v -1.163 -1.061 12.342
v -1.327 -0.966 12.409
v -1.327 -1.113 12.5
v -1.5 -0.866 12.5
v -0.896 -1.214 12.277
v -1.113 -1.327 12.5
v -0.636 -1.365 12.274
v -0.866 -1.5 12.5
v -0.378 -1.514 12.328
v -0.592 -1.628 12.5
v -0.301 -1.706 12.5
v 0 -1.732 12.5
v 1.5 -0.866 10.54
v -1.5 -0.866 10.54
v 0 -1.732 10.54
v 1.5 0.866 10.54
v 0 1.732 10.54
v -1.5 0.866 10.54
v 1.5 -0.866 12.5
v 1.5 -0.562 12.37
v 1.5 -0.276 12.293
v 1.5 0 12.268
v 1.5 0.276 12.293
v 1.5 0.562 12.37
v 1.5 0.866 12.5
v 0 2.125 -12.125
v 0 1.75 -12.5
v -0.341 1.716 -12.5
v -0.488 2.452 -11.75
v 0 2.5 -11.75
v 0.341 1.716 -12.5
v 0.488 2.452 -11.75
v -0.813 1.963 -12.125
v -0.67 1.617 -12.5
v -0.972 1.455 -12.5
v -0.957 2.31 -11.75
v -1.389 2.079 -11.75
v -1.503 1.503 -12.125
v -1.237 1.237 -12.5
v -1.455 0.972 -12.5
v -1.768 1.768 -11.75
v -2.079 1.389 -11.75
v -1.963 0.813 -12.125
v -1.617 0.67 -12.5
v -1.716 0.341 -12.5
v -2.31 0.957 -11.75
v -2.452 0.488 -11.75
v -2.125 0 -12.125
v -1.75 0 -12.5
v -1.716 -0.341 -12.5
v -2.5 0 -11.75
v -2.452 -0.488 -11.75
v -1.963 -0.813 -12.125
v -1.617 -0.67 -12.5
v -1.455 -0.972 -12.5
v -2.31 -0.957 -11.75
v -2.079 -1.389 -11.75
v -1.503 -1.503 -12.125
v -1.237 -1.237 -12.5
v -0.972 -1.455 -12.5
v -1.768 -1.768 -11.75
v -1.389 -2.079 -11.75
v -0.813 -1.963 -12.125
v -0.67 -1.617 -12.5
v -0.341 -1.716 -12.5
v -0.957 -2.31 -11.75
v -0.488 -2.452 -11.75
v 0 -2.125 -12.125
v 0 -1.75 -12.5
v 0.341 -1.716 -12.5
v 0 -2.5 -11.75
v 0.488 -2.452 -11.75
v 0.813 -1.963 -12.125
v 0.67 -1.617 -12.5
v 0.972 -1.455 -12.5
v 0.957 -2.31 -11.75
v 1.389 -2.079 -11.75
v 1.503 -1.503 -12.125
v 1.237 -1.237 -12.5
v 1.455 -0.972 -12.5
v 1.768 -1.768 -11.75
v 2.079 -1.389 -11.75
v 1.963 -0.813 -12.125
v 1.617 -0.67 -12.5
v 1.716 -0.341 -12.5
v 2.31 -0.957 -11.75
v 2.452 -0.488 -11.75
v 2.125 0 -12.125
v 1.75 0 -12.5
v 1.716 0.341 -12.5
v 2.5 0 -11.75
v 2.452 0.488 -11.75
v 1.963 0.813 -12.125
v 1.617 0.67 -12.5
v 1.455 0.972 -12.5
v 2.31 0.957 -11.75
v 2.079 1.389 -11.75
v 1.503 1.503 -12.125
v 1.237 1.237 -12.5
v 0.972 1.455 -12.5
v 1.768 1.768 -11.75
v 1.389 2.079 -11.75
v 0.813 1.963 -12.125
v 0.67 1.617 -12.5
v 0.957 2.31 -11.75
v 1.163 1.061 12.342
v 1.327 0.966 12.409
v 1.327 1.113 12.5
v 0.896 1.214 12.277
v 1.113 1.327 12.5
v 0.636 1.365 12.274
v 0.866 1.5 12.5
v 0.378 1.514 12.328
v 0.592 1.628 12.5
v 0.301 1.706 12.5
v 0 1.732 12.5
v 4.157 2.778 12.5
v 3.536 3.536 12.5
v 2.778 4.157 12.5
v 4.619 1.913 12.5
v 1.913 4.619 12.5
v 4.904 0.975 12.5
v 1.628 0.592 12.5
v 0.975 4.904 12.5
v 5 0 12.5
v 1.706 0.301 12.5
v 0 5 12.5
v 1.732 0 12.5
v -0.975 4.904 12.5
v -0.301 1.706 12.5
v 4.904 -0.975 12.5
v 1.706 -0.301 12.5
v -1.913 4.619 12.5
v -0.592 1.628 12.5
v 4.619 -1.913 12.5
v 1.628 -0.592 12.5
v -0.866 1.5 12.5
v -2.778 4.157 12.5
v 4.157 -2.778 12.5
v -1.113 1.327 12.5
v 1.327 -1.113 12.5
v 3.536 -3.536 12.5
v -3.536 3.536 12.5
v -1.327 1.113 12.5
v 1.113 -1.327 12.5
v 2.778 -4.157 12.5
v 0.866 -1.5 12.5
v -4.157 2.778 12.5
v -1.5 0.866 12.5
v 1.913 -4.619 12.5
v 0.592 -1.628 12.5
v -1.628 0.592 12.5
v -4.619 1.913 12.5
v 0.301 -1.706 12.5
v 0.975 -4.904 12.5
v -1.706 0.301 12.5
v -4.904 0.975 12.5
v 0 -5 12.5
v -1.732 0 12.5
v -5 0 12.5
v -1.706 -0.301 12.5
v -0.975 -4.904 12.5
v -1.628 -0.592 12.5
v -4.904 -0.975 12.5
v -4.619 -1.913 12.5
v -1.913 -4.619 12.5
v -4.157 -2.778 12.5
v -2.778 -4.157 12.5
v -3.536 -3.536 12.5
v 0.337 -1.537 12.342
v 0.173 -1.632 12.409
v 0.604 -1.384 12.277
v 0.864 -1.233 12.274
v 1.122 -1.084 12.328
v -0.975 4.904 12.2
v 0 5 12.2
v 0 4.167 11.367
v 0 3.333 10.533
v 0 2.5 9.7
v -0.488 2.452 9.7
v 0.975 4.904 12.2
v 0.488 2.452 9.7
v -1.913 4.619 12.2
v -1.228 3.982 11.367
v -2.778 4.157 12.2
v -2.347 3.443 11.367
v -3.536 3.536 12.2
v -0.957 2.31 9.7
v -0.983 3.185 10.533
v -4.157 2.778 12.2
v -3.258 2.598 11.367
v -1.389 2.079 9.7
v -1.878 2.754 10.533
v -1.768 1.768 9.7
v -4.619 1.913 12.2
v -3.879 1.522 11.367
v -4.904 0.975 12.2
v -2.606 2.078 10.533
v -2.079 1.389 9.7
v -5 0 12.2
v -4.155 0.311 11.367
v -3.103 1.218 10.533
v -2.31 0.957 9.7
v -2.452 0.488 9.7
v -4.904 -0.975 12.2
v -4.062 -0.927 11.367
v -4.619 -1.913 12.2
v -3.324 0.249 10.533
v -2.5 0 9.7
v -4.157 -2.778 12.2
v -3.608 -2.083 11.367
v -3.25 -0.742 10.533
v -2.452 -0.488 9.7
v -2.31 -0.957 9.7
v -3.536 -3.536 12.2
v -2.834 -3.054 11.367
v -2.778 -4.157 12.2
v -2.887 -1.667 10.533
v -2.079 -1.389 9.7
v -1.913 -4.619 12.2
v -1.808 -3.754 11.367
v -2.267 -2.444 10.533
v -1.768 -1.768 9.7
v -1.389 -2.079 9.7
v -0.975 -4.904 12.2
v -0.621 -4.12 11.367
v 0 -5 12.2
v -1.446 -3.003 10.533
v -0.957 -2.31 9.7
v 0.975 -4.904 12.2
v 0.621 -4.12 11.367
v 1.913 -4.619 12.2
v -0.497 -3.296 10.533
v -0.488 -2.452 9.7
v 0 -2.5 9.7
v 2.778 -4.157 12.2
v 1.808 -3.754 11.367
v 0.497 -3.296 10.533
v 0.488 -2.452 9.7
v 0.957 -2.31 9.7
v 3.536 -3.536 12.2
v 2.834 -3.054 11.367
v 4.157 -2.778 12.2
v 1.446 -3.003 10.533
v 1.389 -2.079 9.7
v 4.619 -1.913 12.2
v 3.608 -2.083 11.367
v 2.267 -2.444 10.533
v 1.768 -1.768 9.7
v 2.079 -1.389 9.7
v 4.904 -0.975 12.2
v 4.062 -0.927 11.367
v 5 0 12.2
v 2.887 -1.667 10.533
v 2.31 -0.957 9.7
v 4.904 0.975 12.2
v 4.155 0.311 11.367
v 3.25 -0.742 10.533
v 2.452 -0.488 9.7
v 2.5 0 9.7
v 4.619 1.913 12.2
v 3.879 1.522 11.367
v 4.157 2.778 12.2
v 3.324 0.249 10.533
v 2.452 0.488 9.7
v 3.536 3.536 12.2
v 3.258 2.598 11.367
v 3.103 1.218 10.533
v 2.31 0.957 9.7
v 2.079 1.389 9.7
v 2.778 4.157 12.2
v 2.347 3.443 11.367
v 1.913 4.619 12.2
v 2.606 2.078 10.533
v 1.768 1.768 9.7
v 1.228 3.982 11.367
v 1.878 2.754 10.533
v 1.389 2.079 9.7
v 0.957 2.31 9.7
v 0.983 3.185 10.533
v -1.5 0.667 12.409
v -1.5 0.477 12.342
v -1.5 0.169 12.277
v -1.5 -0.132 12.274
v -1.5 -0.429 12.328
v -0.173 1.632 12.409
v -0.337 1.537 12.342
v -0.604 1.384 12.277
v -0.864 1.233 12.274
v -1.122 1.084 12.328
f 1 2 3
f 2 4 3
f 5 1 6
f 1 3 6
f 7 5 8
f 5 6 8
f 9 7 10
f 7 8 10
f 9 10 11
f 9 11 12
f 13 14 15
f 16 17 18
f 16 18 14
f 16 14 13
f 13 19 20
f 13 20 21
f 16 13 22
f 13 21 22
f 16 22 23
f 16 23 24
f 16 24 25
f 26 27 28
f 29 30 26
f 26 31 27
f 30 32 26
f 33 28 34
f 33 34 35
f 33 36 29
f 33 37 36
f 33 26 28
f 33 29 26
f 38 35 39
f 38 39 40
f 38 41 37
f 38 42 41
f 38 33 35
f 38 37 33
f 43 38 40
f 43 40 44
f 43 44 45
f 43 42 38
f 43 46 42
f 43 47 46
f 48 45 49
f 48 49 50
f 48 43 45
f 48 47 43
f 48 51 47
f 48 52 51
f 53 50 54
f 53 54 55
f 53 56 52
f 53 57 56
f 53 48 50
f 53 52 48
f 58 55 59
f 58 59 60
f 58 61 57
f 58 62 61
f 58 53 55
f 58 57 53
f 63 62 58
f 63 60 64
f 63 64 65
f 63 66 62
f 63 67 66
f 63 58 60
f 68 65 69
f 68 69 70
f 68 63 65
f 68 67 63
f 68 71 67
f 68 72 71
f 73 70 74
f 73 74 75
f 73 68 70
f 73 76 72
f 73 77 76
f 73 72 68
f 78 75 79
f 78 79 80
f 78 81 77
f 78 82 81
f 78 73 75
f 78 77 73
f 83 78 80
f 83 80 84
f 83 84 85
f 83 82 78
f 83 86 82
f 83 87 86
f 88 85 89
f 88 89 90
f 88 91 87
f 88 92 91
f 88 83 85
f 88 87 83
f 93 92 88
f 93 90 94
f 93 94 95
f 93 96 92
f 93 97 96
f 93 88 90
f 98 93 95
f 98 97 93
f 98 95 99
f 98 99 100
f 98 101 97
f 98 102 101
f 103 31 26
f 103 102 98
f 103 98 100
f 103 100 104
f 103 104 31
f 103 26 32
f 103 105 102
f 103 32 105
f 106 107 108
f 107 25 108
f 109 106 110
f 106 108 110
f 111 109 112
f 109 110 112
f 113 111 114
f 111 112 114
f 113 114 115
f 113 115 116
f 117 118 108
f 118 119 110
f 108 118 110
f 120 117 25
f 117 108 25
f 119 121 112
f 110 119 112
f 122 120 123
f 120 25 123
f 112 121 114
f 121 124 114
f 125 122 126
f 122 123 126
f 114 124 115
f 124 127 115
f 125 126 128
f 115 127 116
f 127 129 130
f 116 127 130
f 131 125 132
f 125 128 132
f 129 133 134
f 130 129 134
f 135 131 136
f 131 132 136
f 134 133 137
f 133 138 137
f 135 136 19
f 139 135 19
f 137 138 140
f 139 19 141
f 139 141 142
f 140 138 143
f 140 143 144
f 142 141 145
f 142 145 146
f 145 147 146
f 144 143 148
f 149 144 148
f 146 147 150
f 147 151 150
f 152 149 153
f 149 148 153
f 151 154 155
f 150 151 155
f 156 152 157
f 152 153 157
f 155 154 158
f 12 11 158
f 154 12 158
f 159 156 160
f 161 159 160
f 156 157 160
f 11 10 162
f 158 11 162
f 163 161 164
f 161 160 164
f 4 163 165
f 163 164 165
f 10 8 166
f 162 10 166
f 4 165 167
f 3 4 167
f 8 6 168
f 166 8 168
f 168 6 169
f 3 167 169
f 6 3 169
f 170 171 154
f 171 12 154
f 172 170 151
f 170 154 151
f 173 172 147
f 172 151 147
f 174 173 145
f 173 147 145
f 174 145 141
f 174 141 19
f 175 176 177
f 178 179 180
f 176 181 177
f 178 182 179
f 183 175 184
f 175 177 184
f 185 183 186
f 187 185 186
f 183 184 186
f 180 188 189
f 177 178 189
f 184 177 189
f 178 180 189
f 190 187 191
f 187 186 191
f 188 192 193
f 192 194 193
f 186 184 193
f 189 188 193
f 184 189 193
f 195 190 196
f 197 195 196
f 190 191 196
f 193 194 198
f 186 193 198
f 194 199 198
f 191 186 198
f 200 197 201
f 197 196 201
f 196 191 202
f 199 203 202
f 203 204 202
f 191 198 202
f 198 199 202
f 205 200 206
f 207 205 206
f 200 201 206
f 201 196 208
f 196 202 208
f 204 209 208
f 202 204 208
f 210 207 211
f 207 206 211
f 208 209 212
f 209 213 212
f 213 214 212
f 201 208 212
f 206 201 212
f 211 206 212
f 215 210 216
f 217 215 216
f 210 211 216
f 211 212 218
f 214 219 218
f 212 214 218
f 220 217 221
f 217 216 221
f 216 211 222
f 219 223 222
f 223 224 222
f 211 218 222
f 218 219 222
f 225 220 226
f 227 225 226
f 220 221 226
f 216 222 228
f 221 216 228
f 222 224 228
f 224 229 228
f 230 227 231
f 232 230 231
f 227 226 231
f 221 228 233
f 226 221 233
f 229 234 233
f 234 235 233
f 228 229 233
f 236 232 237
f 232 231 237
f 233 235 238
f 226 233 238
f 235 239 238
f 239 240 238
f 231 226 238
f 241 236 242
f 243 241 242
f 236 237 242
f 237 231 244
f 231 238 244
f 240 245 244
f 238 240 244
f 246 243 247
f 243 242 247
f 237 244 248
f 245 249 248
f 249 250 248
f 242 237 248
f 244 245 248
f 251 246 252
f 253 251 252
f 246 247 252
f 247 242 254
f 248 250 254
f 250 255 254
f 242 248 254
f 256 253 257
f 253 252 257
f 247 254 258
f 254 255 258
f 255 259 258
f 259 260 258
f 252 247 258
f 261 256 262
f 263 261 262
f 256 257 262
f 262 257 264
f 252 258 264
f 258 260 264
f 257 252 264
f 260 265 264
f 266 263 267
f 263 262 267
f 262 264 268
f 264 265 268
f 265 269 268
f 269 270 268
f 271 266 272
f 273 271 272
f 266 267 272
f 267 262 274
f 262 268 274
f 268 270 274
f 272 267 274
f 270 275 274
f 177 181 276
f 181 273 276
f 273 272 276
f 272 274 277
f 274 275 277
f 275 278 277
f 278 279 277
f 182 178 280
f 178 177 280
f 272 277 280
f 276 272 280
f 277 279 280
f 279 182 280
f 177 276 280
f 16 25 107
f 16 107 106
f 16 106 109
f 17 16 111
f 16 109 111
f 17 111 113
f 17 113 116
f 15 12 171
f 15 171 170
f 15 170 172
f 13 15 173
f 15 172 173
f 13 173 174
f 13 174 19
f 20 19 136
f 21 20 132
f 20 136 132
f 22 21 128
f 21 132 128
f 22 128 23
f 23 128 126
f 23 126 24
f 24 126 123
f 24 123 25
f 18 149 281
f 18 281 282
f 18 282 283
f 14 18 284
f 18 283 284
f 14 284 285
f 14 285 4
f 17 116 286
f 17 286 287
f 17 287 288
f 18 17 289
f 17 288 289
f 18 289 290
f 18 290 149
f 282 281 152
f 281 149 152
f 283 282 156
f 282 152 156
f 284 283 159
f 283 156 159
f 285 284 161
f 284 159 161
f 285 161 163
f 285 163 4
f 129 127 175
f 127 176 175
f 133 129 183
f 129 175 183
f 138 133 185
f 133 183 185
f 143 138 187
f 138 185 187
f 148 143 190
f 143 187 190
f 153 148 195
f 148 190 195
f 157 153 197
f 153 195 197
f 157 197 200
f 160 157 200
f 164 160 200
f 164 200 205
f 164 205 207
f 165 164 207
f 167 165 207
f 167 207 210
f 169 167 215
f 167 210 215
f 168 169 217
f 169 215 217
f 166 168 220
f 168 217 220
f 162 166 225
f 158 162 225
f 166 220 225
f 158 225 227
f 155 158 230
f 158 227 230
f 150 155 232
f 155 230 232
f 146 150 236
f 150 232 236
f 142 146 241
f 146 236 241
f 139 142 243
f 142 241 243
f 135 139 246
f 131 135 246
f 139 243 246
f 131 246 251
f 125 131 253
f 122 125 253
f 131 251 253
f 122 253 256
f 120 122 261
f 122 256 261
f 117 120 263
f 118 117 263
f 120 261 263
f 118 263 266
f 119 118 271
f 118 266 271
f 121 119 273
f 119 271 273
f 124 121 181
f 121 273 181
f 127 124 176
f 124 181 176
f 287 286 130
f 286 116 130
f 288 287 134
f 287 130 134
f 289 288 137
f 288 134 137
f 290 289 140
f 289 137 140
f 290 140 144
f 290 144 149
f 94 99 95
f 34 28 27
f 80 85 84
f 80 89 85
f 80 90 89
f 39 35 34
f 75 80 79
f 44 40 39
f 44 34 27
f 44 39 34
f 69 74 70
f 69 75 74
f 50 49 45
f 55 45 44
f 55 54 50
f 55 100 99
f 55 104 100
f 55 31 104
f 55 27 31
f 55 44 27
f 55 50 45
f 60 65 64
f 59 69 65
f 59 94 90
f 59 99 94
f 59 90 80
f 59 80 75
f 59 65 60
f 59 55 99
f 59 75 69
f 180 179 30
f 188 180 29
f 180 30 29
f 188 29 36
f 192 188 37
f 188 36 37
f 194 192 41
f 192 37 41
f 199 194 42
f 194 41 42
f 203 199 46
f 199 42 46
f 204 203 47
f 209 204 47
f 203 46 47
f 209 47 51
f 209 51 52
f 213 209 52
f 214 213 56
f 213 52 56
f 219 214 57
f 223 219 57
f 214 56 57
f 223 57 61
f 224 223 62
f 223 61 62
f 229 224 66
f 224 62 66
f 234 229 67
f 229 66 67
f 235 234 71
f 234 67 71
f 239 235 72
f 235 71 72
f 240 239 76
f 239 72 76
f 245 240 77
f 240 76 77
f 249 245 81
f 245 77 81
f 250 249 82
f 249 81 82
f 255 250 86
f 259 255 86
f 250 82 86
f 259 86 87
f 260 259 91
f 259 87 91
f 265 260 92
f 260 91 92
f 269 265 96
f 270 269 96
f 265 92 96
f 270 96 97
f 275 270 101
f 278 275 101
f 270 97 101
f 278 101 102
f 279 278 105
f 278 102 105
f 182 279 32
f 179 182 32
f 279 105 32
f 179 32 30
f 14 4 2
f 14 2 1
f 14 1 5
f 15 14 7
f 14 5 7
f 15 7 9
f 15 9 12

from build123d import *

# Parameters (mm, degrees)
SKETCH3_W          = 25
SKETCH3_H          = 2.5
CHAMFER1_SIZE      = 0.75
CUT_EXTRUDE1_DEPTH = 1.96
SKETCH9_R          = 1.732050808
CUT_EXTRUDE2_DEPTH = 1.96
CUT_EXTRUDE2_DRAFT = -45


with BuildPart() as part:
    # Sketch3 → Revolve1 (revolve)
    with BuildSketch(Plane(origin=(0, 0, 0), x_dir=(0, 0, -1), z_dir=(1, 0, 0))):
        with Locations((0, 1.25)):
            Rectangle(SKETCH3_W, SKETCH3_H)
    revolve(axis=Axis((0, 0, -12.5), (0, 0, 1)))

    # Chamfer1
    chamfer1_edges = [part.edges().sort_by_distance(p)[0] for p in [
        (0, -2.5, -12.5),
    ]]
    chamfer(chamfer1_edges, length=CHAMFER1_SIZE)

    # Sketch6 → Revolve2 (revolve)
    with BuildSketch(Plane(origin=(0, 0, 0), x_dir=(0, 0, -1), z_dir=(1, 0, 0))):
        Polygon((-12.5, 5), (-12.2, 5), (-9.7, 2.5), (-9.7, 0), (-12.5, 0), align=None)
    revolve(axis=Axis((0, 0, -12.5), (0, 0, 1)))

    # Sketch8 → Cut-Extrude1 (cut)
    with BuildSketch(Plane.XY.offset(12.5)):
        Polygon((0, 1.732050808), (-1.5, 0.866025404), (-1.5, -0.866025404), (0, -1.732050808), (1.5, -0.866025404), (1.5, 0.866025404), align=None)
    extrude(amount=-CUT_EXTRUDE1_DEPTH, mode=Mode.SUBTRACT)


with BuildPart() as cut_extrude2_tool:
    # Sketch9 → Cut-Extrude2 (with draft: the straight prism first)
    with BuildSketch(Plane.XY.offset(12.5)):
        Circle(SKETCH9_R)
    extrude(amount=-CUT_EXTRUDE2_DEPTH)
    # Cut-Extrude2: the draft: its side faces are tilted about the plane it starts from
    cut_extrude2_sides = [cut_extrude2_tool.faces().sort_by_distance(p)[0] for p in [
        (-1.732050808, 0, 11.52),
    ]]
    draft(cut_extrude2_sides, Plane.XY.offset(12.5), CUT_EXTRUDE2_DRAFT)


with BuildPart() as part_1:
    add(part.part)

    # Cut-Extrude2: cut by cut_extrude2_tool
    add(cut_extrude2_tool.part, mode=Mode.SUBTRACT)


solid = part_1.part
